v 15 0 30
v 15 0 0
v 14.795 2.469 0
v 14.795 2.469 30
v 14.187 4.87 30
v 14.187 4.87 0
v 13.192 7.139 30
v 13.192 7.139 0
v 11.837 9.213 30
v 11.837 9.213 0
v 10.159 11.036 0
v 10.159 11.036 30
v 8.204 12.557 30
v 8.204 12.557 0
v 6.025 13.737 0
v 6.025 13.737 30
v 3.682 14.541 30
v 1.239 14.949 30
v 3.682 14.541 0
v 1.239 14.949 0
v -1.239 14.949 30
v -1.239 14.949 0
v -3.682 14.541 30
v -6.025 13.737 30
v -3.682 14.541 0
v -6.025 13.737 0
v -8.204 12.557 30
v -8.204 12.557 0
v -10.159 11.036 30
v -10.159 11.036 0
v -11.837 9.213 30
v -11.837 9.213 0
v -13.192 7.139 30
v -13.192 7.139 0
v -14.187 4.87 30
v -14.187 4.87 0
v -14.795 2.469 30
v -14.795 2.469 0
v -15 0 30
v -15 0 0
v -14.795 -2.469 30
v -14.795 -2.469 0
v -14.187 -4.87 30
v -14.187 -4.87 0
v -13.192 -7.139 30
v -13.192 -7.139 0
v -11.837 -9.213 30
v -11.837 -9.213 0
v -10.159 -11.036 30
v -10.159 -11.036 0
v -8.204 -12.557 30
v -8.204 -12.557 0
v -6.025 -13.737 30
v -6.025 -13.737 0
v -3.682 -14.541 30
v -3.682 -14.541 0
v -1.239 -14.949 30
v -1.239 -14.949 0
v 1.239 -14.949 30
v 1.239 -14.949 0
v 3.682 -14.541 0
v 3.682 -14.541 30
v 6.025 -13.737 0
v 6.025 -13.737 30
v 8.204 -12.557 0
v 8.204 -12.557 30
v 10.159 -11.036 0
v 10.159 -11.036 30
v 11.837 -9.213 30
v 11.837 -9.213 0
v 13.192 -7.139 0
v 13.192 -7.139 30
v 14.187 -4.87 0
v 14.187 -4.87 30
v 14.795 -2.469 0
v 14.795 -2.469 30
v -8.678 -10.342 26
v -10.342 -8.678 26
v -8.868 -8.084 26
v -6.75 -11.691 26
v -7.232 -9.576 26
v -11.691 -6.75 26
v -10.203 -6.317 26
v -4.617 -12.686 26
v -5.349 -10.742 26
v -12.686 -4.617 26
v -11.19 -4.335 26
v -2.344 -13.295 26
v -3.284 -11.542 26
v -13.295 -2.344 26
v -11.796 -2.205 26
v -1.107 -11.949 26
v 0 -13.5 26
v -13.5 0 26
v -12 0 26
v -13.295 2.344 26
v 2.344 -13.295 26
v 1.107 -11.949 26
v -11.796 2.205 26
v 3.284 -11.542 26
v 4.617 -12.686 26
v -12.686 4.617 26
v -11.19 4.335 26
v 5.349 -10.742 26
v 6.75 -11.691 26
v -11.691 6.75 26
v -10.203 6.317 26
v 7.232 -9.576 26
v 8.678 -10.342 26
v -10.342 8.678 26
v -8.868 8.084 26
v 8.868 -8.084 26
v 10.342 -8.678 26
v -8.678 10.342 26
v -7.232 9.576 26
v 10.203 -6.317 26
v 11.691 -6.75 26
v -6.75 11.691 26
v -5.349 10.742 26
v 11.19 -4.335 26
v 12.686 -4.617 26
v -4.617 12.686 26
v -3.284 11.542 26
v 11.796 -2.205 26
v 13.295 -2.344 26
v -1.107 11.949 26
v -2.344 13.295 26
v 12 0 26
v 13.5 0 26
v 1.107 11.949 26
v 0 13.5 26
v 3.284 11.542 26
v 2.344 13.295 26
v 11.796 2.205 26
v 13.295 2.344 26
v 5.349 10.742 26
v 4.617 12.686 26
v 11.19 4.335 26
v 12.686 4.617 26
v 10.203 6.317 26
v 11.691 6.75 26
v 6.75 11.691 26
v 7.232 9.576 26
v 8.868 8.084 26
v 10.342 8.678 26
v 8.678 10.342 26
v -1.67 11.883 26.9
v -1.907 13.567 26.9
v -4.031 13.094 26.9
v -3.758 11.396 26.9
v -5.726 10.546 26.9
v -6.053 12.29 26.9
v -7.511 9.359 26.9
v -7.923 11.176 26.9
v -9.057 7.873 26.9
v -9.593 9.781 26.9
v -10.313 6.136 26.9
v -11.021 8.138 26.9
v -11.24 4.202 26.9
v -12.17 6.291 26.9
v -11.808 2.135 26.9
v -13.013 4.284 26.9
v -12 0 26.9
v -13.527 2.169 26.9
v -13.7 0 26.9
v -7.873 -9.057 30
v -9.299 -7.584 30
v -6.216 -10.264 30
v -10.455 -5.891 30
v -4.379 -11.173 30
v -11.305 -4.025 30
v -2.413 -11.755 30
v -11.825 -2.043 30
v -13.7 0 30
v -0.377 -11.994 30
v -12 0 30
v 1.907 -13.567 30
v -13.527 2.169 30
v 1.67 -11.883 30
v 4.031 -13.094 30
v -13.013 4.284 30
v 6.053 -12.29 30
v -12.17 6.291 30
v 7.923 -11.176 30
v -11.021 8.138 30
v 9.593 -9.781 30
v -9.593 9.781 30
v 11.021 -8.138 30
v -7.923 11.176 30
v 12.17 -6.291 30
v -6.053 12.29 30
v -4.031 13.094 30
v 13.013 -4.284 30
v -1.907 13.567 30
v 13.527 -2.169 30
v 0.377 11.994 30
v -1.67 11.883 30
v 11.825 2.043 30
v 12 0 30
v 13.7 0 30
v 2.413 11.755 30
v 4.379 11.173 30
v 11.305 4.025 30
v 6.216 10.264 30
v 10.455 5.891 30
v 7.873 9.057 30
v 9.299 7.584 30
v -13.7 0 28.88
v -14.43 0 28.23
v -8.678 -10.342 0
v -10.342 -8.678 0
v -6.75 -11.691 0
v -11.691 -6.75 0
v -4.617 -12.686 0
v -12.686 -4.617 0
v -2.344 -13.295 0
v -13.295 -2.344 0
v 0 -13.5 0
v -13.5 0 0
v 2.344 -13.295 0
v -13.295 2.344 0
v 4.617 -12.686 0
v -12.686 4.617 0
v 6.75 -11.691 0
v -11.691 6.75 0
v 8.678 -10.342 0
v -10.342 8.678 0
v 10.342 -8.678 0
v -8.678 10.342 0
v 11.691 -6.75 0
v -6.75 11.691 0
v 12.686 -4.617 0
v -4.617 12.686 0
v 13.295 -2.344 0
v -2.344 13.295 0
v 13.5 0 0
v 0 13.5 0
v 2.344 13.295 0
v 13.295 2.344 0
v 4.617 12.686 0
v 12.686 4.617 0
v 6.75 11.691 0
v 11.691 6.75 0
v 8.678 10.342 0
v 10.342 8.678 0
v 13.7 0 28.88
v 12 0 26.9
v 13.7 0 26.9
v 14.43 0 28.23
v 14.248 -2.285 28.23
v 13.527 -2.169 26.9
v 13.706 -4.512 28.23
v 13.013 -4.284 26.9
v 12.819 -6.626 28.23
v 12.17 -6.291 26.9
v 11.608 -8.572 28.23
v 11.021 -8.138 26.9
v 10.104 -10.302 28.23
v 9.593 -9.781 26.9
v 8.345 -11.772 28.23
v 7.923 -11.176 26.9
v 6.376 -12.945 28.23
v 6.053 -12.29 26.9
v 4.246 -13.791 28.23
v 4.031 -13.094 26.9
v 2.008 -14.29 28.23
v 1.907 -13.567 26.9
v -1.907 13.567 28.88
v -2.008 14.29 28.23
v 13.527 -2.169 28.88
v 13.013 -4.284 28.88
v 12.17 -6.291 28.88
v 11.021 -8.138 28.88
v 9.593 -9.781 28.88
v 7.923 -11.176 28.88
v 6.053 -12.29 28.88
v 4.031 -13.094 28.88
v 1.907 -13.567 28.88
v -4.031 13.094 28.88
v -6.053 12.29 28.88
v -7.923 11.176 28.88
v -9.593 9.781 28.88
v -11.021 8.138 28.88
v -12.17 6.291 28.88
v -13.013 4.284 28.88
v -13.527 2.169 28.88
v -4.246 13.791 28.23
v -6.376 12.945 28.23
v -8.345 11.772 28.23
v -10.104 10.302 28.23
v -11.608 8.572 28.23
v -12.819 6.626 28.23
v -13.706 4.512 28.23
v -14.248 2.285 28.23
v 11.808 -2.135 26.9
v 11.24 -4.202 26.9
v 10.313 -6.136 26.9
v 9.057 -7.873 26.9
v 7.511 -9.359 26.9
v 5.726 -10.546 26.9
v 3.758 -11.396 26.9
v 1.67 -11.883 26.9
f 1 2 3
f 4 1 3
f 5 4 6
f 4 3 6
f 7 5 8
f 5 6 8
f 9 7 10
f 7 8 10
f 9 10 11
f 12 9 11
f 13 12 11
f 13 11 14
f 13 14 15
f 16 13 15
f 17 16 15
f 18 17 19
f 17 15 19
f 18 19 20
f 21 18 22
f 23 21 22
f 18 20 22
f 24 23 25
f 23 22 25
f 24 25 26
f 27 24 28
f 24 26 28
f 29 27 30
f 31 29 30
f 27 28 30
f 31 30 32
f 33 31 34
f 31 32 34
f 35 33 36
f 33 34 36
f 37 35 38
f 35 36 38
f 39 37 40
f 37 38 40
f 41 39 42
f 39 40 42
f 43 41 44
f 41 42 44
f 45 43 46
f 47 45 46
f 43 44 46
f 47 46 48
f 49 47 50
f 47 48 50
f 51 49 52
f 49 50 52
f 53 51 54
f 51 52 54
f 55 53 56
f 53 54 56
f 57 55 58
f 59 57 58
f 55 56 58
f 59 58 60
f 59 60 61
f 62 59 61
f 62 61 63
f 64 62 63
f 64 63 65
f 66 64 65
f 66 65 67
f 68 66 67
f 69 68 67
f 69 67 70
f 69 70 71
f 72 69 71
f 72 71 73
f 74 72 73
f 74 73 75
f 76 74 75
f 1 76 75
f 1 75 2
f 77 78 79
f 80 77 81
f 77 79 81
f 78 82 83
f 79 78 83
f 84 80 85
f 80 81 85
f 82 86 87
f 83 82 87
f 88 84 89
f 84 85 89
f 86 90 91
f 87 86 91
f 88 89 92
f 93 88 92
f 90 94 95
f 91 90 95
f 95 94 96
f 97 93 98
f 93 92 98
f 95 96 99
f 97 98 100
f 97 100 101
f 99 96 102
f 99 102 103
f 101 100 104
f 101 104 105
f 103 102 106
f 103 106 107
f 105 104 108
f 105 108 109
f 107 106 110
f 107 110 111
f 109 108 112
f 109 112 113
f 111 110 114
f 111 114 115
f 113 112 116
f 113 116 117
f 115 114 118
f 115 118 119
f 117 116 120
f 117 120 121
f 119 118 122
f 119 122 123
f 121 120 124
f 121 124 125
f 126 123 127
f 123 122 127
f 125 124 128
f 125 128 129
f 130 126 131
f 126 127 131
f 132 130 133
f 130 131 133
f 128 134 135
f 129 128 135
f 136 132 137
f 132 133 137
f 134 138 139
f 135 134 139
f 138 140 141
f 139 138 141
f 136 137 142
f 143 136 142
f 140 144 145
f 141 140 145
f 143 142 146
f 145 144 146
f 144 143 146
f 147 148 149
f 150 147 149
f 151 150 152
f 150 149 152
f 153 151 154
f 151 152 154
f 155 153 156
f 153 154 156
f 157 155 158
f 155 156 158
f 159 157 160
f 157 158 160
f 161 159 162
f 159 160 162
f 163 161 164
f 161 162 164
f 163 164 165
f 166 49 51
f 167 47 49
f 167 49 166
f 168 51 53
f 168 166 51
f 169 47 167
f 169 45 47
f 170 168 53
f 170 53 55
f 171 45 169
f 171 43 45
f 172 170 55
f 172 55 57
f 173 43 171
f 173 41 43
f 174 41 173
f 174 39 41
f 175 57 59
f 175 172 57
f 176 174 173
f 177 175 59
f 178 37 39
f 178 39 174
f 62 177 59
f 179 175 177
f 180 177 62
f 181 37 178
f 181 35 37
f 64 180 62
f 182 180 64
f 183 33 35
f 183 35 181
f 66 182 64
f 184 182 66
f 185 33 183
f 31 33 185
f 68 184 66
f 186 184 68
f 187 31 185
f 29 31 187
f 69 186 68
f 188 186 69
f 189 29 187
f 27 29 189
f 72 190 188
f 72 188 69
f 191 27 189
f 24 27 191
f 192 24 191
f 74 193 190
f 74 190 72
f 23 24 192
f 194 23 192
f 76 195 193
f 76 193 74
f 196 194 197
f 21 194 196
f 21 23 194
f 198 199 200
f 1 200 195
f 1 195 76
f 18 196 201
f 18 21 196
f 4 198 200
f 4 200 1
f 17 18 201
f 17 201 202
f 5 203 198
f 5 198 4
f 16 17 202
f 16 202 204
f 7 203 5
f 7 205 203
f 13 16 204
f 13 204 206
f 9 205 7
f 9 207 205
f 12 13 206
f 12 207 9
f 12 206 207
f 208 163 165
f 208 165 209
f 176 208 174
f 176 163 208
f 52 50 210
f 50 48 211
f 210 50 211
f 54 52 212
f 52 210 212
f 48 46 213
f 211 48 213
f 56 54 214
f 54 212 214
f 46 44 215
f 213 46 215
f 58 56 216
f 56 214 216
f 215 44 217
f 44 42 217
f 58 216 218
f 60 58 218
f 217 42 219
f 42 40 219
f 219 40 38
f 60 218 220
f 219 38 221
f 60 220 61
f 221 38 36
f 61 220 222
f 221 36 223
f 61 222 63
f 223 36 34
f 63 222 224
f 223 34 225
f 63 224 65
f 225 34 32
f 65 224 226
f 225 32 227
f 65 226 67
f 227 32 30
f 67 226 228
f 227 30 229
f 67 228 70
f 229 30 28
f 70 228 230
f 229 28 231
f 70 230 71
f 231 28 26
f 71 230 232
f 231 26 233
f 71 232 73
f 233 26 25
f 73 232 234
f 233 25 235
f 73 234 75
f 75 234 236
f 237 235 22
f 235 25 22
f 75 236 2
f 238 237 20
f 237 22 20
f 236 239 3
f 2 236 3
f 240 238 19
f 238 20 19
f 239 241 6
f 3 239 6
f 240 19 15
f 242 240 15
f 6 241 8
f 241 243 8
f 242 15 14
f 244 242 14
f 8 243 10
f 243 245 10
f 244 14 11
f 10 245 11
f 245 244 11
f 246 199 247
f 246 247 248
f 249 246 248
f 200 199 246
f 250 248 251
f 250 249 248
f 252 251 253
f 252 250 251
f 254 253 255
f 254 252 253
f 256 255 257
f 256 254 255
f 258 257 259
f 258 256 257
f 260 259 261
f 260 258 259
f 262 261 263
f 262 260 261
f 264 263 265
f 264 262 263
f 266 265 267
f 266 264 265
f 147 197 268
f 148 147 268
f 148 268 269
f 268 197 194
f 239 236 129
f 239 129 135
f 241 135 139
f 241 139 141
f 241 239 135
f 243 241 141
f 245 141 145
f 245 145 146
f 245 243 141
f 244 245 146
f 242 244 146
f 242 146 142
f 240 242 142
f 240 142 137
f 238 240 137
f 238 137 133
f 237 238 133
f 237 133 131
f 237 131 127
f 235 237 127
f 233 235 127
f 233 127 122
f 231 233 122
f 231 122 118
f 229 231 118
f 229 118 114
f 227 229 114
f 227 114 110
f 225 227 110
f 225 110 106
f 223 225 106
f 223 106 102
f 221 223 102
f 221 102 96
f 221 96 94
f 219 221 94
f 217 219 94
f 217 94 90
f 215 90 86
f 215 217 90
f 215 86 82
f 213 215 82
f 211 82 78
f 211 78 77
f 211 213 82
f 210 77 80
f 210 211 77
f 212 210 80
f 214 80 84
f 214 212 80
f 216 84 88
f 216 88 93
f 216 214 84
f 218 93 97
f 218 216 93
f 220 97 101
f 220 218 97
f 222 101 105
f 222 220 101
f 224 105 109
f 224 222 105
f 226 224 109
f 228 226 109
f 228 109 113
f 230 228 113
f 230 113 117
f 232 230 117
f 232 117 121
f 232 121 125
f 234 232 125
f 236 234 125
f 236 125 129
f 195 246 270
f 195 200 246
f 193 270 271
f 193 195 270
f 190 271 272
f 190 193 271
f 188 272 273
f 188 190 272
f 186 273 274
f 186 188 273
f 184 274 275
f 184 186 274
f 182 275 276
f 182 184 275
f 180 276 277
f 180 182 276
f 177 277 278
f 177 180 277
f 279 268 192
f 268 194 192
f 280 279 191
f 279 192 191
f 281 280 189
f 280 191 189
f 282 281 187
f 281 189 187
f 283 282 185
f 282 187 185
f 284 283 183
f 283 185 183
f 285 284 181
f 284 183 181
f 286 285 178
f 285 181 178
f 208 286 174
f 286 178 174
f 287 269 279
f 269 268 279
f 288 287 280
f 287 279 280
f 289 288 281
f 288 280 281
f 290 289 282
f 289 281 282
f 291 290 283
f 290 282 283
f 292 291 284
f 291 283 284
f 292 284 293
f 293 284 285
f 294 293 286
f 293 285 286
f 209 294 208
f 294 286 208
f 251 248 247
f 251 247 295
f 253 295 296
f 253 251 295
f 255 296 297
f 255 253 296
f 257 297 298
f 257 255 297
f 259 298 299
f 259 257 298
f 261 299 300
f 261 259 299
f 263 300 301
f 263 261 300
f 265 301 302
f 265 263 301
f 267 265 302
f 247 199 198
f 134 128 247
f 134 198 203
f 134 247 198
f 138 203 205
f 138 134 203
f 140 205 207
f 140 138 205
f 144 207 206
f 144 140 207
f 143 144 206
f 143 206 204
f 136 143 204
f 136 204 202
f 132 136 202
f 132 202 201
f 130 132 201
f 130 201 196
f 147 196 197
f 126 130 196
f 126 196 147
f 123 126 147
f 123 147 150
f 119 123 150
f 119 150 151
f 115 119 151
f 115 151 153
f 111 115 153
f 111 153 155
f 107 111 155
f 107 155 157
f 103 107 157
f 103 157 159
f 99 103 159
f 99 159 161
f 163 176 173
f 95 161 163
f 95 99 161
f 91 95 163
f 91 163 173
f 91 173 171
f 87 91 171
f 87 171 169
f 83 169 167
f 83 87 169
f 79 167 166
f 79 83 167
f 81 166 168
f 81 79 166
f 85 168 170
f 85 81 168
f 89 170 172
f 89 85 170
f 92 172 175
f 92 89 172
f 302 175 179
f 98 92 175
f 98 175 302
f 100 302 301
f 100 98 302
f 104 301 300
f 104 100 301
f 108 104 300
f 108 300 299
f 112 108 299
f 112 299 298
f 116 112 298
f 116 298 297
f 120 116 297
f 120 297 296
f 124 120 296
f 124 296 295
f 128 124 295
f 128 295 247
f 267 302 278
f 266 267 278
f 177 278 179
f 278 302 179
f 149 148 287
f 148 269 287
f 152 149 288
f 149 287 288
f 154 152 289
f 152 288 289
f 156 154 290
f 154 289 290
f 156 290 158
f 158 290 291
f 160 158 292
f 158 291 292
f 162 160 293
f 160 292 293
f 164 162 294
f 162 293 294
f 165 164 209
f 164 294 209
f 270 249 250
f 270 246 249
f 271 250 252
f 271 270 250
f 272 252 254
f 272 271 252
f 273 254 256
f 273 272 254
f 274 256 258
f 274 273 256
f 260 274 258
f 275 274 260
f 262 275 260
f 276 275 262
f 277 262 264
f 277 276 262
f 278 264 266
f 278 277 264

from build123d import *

# Parameters (mm, degrees)
IZIM1_R                     = 15
IZIM1_R_2                   = 13.5
Y_KSEKLIK_EKSTR_ZYON1_DEPTH = 30
Y_KSEKLIK_EKSTR_ZYON2_START = -4
IZIM3_R                     = 13.5
IZIM3_R_2                   = 12
Y_KSEKLIK_EKSTR_ZYON2_DEPTH = 4


with BuildPart() as part:
    # Çizim1 → Yükseklik-Ekstrüzyon1 (new body)
    with BuildSketch(Plane.XY):
        Circle(IZIM1_R)
        Circle(IZIM1_R_2, mode=Mode.SUBTRACT)
    extrude(amount=Y_KSEKLIK_EKSTR_ZYON1_DEPTH)

    # Çizim3 → Yükseklik-Ekstrüzyon2 (add)
    with BuildSketch(Plane.XY.offset(30).offset(Y_KSEKLIK_EKSTR_ZYON2_START)):
        Circle(IZIM3_R)
        Circle(IZIM3_R_2, mode=Mode.SUBTRACT)
    extrude(amount=Y_KSEKLIK_EKSTR_ZYON2_DEPTH)

    # Kes-Süpür2: sweep along a path in Çizim5
    with BuildLine(Plane.XY.offset(30)) as kes_s_p_r2_path:
        ThreePointArc((-1.906671483, 13.566672542), (-10.339521249, 8.988008697), (-13.7, 0))
    # Çizim4 → Kes-Süpür2 (sweep, cut)
    with BuildSketch(Plane(origin=(0, 0, 0), x_dir=(1, 0, 0), z_dir=(0, 1, 0))):
        Polygon((-13.7, -30), (-13.7, -28.88), (-14.43, -28.23), (-13.7, -26.9), (-11.7, -26.9), (-11.7, -30), align=None)
    kes_s_p_r2 = sweep(path=kes_s_p_r2_path.line, mode=Mode.SUBTRACT)

    # Aynalama2: Kes-Süpür2 across plane
    add(kes_s_p_r2.mirror(Plane(origin=(0, 0, 0), x_dir=(0, 0, 1), z_dir=(0.7547095802227689, -0.6560590289905109, 0))), mode=Mode.SUBTRACT)


solid = part.part
